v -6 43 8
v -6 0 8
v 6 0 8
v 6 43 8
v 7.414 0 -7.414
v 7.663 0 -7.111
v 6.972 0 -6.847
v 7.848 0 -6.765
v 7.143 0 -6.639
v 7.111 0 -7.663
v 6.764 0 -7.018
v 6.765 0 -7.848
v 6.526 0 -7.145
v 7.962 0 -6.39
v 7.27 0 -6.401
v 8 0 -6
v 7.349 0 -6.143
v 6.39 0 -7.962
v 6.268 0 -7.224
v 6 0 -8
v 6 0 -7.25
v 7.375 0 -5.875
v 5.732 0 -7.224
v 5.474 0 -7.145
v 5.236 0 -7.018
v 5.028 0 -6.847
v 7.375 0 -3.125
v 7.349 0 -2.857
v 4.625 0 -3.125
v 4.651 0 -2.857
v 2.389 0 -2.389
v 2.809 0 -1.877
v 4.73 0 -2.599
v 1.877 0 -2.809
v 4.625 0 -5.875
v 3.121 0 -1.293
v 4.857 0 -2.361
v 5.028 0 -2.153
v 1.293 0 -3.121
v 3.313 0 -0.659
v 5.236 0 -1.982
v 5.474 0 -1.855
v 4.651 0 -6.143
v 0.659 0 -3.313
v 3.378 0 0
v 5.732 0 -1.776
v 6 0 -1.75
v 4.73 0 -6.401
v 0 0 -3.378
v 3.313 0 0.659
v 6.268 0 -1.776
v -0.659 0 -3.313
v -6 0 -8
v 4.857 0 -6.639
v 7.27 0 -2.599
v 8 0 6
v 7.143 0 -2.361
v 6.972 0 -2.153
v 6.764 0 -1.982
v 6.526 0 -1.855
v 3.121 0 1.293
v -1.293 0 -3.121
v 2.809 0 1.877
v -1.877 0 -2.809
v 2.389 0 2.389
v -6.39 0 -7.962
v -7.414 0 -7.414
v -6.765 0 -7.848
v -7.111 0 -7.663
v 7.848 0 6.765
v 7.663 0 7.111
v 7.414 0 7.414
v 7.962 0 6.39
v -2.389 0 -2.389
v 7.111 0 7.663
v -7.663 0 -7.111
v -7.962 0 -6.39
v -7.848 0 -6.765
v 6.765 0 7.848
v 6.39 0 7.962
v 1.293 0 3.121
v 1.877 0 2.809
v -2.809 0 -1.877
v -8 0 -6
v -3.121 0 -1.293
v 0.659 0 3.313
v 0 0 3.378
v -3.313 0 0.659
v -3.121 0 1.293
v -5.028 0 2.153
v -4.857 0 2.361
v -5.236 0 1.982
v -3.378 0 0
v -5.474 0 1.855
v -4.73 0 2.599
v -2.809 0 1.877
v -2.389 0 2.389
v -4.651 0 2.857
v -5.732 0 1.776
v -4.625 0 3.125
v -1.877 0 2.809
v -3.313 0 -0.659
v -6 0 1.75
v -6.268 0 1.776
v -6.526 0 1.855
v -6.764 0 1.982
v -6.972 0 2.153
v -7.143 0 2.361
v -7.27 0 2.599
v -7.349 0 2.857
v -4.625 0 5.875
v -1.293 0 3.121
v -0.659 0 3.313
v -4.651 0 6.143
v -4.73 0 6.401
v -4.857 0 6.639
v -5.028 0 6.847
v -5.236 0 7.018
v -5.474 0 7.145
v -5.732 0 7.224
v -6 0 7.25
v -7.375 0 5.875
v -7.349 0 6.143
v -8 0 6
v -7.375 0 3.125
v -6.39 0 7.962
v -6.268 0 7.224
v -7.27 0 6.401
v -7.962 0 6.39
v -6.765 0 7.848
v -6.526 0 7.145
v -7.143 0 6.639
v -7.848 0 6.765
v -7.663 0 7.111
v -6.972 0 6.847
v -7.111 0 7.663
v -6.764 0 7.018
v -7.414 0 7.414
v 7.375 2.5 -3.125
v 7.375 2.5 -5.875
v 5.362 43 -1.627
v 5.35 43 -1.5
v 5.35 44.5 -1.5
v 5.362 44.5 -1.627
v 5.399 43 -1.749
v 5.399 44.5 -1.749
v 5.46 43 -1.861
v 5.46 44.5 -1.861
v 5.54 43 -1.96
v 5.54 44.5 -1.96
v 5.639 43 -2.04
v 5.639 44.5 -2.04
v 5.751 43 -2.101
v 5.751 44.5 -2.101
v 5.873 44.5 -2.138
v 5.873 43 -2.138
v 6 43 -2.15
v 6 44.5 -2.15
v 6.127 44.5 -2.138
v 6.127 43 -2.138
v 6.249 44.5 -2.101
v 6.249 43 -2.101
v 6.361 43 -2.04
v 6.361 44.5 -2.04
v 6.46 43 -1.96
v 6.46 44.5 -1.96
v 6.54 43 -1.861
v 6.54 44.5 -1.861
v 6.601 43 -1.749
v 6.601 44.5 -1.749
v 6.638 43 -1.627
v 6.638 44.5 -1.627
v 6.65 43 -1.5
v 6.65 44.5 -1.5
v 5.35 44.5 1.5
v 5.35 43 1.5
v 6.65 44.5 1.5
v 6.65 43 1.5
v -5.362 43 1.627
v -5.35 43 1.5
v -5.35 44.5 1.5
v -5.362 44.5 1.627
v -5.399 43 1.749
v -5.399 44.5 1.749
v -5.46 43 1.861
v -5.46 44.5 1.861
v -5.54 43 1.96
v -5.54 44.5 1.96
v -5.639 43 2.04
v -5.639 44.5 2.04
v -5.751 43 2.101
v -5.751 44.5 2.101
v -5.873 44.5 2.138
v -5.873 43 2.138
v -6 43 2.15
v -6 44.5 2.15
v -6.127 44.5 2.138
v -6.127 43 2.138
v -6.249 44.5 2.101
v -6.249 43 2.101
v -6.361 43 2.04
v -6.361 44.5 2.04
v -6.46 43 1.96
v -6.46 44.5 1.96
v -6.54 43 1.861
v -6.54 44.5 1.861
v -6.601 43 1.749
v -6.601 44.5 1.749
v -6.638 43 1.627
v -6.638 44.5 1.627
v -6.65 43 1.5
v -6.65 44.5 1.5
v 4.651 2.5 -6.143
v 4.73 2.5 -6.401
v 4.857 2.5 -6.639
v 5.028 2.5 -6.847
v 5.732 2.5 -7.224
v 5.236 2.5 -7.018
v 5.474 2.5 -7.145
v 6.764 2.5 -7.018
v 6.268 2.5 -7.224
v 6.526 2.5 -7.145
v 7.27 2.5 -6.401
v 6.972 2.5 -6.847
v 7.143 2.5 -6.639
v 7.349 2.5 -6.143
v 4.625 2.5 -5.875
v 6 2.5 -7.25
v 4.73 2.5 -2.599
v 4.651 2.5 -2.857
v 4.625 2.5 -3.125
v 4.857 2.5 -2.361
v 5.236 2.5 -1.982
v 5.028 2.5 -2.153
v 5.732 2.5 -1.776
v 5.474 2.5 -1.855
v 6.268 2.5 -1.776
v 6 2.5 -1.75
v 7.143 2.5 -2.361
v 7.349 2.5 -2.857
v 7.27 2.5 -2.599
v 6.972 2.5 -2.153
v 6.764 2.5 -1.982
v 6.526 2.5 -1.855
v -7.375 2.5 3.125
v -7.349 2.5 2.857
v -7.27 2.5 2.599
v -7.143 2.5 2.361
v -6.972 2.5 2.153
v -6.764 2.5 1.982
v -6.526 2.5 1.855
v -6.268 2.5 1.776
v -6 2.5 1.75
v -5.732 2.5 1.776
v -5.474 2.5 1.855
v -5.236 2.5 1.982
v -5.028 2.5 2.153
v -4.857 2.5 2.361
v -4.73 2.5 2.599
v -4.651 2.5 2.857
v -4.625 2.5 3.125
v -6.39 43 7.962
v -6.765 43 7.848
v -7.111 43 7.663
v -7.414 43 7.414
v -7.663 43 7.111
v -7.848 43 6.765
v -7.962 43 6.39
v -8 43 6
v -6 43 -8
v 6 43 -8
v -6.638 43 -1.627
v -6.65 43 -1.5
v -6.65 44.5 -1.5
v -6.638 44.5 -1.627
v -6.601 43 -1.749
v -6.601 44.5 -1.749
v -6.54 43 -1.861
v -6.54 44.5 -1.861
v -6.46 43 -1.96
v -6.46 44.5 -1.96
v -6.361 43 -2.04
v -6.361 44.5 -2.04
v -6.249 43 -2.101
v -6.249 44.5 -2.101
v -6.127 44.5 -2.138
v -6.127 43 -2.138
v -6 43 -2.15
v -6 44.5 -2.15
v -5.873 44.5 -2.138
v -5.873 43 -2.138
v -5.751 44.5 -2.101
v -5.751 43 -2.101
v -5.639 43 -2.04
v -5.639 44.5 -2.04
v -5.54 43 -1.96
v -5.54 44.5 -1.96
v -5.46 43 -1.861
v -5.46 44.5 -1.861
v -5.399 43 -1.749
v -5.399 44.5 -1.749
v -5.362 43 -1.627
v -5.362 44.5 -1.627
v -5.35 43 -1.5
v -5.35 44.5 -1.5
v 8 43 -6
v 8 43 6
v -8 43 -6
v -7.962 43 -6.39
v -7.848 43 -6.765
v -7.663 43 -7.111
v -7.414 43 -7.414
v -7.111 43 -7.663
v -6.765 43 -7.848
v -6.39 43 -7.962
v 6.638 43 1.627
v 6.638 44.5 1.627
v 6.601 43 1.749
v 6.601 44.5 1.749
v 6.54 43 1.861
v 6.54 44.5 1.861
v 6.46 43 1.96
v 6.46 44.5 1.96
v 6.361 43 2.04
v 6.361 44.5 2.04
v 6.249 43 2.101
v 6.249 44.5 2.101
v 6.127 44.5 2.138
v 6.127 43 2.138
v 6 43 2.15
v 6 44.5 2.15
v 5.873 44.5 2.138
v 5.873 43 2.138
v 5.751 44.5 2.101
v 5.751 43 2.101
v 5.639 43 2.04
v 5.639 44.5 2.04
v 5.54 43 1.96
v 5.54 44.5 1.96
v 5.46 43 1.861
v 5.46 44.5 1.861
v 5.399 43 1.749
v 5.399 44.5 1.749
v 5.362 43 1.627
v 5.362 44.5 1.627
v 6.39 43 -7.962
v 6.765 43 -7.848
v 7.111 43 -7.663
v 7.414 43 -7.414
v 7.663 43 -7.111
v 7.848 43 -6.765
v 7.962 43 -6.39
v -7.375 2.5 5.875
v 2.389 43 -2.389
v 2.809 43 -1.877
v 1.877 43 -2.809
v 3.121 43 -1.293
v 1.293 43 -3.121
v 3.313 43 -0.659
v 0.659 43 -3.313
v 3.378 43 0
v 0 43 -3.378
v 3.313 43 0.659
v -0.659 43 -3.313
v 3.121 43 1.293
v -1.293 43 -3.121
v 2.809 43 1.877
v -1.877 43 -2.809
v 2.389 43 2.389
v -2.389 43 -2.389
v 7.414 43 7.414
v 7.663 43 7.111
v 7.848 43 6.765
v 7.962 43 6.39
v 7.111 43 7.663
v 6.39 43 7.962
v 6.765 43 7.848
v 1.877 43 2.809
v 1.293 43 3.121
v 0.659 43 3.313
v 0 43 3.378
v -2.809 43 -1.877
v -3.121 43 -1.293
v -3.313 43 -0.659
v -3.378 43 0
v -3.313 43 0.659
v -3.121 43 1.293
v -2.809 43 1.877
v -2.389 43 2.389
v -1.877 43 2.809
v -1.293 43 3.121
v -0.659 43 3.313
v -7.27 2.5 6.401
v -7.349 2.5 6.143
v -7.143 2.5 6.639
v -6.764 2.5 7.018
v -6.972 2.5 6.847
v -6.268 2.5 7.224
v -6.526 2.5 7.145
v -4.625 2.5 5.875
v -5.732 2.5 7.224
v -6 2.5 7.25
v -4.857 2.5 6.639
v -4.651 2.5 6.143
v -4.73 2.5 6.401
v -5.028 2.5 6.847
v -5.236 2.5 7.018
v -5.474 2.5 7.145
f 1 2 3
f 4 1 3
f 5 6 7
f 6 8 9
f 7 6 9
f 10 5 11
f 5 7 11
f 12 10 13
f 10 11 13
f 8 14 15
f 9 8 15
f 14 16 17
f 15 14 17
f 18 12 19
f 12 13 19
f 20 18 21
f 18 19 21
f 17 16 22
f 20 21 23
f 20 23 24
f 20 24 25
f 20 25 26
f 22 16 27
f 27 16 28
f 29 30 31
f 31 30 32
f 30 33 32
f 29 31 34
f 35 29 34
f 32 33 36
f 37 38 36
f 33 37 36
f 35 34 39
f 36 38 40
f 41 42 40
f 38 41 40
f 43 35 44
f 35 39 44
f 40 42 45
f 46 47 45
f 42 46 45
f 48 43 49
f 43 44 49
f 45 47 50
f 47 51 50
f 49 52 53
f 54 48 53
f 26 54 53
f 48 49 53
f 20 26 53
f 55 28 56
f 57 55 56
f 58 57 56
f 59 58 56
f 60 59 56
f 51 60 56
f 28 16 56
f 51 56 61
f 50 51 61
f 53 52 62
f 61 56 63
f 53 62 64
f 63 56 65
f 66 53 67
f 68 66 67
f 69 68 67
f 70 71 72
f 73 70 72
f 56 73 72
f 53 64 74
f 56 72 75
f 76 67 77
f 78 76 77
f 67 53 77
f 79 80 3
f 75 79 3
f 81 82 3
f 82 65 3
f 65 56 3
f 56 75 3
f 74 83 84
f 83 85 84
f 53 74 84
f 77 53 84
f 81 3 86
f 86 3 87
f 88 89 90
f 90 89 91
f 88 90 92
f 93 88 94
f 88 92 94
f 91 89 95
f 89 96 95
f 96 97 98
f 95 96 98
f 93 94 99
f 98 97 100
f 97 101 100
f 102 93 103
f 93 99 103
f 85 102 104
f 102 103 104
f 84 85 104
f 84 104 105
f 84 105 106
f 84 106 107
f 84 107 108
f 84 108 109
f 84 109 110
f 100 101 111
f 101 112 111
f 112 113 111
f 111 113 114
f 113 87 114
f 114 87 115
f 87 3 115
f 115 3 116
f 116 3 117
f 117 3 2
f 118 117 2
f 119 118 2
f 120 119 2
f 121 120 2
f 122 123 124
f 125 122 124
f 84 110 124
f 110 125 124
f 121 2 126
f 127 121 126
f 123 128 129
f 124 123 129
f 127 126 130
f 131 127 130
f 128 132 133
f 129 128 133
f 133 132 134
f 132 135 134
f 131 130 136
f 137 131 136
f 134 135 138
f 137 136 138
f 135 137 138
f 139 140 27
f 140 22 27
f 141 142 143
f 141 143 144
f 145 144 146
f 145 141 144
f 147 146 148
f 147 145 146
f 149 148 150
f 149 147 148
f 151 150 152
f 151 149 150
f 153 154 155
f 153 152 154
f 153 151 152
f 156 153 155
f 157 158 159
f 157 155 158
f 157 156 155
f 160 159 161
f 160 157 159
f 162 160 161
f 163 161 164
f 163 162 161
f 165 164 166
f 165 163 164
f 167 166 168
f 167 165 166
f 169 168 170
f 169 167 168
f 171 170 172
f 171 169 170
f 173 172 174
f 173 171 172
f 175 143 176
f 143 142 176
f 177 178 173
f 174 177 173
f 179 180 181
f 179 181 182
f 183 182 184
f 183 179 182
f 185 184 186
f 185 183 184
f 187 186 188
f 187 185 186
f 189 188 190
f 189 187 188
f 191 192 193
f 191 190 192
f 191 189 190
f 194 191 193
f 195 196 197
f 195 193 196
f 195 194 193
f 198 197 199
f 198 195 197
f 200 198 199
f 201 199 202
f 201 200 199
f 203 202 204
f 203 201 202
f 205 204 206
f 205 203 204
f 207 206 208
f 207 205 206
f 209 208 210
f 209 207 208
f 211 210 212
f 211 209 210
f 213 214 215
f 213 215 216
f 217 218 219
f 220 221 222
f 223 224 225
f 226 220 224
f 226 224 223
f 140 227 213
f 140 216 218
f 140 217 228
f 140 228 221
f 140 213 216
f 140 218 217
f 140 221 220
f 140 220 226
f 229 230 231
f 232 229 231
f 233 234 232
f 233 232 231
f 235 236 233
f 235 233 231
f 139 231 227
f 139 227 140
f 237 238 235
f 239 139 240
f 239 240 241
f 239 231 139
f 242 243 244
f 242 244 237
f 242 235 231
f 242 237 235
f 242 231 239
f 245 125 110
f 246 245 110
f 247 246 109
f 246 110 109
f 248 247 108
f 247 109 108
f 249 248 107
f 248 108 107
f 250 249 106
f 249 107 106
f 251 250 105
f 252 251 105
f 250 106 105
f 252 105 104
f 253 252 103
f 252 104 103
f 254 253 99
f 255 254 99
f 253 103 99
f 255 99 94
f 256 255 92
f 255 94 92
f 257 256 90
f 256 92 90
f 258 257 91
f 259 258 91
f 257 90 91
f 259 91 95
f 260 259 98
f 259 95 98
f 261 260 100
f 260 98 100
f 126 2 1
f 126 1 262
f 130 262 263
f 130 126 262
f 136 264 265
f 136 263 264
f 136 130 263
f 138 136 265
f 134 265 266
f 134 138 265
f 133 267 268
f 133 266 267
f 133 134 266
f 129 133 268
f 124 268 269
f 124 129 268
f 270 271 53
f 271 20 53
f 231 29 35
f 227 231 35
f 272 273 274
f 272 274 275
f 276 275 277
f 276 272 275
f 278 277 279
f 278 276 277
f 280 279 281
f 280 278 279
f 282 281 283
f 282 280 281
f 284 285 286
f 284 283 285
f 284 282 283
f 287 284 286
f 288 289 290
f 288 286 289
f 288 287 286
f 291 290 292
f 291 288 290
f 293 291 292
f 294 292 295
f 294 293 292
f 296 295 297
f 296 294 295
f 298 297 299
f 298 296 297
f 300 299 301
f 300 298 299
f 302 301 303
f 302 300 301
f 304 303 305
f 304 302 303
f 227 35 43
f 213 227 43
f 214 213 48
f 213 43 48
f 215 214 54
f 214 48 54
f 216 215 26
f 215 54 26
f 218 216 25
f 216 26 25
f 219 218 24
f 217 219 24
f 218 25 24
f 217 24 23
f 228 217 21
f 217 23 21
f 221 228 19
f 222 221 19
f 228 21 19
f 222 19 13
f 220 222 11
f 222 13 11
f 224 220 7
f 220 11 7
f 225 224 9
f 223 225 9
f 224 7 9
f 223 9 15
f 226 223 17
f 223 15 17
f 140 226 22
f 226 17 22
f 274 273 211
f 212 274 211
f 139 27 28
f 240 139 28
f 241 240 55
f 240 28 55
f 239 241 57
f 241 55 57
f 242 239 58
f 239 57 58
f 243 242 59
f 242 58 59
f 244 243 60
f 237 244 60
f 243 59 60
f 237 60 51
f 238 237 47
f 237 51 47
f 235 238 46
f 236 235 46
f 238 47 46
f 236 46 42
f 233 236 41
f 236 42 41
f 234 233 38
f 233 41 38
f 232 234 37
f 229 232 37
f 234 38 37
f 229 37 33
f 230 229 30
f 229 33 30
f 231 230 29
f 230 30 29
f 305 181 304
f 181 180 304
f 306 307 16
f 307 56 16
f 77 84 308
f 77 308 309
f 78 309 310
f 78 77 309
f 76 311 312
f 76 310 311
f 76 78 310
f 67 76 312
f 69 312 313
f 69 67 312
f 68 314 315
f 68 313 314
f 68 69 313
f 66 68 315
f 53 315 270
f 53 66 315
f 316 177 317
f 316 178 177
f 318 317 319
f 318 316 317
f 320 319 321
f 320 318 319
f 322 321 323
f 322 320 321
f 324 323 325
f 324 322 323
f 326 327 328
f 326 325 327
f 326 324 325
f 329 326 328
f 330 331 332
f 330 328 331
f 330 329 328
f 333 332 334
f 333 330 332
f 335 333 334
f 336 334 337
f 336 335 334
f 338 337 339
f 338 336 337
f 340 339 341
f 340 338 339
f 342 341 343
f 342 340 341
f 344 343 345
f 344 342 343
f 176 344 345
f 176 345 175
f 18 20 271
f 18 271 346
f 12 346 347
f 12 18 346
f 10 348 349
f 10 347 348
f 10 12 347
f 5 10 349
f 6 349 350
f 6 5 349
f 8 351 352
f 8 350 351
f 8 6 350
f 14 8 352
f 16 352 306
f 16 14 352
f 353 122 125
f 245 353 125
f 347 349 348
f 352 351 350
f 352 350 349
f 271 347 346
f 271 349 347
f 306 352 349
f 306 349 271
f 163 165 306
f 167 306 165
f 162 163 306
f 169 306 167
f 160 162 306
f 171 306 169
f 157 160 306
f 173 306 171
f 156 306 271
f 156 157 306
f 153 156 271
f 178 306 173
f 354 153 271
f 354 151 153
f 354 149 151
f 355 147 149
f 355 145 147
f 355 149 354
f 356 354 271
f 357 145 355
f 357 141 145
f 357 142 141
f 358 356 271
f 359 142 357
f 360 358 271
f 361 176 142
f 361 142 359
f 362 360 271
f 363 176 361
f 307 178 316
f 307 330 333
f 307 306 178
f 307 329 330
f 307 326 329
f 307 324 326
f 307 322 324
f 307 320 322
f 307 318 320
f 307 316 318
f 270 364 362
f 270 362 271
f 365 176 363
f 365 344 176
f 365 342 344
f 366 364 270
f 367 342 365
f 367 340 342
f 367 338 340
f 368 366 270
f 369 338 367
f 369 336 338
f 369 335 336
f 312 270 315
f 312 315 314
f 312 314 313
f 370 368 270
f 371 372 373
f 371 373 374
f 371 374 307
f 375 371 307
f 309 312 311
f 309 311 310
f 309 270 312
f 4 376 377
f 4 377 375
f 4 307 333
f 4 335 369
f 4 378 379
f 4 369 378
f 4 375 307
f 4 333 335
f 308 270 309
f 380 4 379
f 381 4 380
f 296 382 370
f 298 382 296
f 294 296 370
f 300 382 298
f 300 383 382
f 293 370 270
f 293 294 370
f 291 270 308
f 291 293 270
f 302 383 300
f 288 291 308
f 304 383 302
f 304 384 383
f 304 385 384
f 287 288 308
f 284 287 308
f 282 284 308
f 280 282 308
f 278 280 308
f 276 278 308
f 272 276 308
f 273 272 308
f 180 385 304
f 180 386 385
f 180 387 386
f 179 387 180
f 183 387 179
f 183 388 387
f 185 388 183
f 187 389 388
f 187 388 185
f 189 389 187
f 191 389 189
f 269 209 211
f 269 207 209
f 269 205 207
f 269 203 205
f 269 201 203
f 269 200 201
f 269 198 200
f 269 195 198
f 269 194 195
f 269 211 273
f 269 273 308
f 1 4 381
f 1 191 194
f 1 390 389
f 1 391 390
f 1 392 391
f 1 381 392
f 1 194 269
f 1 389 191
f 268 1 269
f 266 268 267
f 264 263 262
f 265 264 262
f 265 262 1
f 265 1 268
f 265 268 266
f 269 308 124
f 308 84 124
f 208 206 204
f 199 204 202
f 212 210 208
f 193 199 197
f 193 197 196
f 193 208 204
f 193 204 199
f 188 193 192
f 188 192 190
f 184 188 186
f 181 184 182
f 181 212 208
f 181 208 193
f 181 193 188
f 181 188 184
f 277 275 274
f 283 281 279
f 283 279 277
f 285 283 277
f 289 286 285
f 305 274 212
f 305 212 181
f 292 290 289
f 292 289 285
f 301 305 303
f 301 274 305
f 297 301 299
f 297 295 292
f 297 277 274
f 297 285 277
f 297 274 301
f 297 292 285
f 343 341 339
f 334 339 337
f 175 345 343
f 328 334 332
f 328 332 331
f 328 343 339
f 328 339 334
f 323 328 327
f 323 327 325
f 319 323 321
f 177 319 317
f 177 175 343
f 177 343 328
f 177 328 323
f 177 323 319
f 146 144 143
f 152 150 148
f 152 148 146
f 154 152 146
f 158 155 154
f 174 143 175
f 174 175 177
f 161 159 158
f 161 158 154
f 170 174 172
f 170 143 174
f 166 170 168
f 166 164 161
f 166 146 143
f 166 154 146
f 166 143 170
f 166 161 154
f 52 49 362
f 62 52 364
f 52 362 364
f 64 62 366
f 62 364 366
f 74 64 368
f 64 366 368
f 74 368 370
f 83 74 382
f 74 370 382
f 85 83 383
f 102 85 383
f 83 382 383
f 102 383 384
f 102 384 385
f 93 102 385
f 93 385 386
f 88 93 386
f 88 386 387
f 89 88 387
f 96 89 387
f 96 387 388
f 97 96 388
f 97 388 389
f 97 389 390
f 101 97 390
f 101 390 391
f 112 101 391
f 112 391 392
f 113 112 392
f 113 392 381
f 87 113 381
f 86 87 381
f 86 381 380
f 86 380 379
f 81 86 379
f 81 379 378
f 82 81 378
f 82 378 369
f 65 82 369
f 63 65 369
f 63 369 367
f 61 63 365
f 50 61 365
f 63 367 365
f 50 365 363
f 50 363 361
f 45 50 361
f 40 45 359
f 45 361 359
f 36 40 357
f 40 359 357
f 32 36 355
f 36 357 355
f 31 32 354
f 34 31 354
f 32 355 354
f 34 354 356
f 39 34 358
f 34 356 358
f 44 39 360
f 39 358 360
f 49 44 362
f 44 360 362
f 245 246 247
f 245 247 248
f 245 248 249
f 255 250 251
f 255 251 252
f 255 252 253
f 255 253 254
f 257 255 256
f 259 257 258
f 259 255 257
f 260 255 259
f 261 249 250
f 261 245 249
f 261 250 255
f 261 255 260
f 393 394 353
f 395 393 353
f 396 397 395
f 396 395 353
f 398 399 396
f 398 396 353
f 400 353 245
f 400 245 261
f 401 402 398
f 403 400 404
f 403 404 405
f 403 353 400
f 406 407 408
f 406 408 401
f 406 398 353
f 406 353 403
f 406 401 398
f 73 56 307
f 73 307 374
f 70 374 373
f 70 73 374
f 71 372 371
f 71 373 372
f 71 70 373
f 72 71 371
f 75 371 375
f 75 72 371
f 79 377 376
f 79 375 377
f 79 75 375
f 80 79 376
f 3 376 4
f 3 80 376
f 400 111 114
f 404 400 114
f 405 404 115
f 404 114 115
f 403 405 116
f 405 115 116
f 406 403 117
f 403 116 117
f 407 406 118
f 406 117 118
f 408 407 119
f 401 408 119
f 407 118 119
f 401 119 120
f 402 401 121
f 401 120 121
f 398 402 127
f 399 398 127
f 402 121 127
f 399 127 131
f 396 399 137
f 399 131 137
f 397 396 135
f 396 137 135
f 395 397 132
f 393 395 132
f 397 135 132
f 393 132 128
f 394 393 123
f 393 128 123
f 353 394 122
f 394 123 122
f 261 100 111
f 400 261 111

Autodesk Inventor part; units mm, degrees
ref_plane "YZ Plane" through (0, 0, 0) normal (1, 0, 0) x (0, 1, 0)
ref_plane "XZ Plane" through (0, 0, 0) normal (0, 1, 0) x (-1, 0, 0)
ref_plane "XY Plane" through (0, 0, 0) normal (0, 0, 1) x (1, 0, 0)
sketch "Sketch1" plane through (0, 0, 0) normal (0, 1, 0) x (-1, 0, 0)
  line L0 (6, 8) -> (-6, 8)
  line L1 (-8, 6) -> (-8, -6)
  line L2 (-6, -8) -> (6, -8)
  line L3 (8, -6) -> (8, 6)
  arc A0 (8, 6) -> (6, 8) centre (6, 6) ccw
  arc A1 (-6, 8) -> (-8, 6) centre (-6, 6) ccw
  arc A2 (-8, -6) -> (-6, -8) centre (-6, -6) ccw
  arc A3 (6, -8) -> (8, -6) centre (6, -6) ccw
  point P0 (0, 0)
  point P1 (8, 8)
  point P2 (-8, 8)
  point P3 (8, -8)
  dimension "d0" = 16
  dimension "d1" = 16
  dimension "d2" = 8
  dimension "d3" = 8
  dimension "d4" = 2
extrude "Extrusion1" add sketch "Sketch1" along normal blind 43
sketch "Sketch2" plane through (0, 0, 0) normal (0, -1, 0) x (1, 0, 0)
  line L0 (-6, 5.875) -> (-6, 3.125) construction
  line L1 (-7.375, 5.875) -> (-7.375, 3.125)
  line L2 (-4.625, 3.125) -> (-4.625, 5.875)
  arc A0 (-4.625, 5.875) -> (-7.375, 5.875) centre (-6, 5.875) ccw
  arc A1 (-7.375, 3.125) -> (-4.625, 3.125) centre (-6, 3.125) ccw
  line L3 (6, -3.125) -> (6, -5.875) construction
  line L4 (4.625, -3.125) -> (4.625, -5.875)
  line L5 (7.375, -5.875) -> (7.375, -3.125)
  arc A2 (7.375, -3.125) -> (4.625, -3.125) centre (6, -3.125) ccw
  arc A3 (4.625, -5.875) -> (7.375, -5.875) centre (6, -5.875) ccw
  point P0 (0, 0)
  point P1 (0, 0)
  point P2 (-6, 4.5)
  point P3 (6, -4.5)
  dimension "d7" = 2.75
  dimension "d8" = 12
  dimension "d9" = 6
  dimension "d10" = 9
  dimension "d11" = 4.5
  dimension "d12" = 2.75
  dimension "d13" = 2.75
  dimension "d14" = 2.75
extrude "Extrusion2" cut sketch "Sketch2" against normal blind 2.5
hole "Hole1" at (0, 0, 0) direction (0, 1, 0) diameter 6.756 end through all clearance for "Flat Head Machine Screw (82)" size "1/4" standard "Ansi Unified Screw Threads"
sketch "Sketch3" plane through (0, 43, 0) normal (0, 1, 0) x (1, 0, 0)
  line L0 (-6, 1.5) -> (-6, -1.5) construction
  line L1 (-6.65, 1.5) -> (-6.65, -1.5)
  line L2 (-5.35, -1.5) -> (-5.35, 1.5)
  arc A0 (-5.35, 1.5) -> (-6.65, 1.5) centre (-6, 1.5) ccw
  arc A1 (-6.65, -1.5) -> (-5.35, -1.5) centre (-6, -1.5) ccw
  line L3 (6, 1.5) -> (6, -1.5) construction
  line L4 (5.35, 1.5) -> (5.35, -1.5)
  line L5 (6.65, -1.5) -> (6.65, 1.5)
  arc A2 (6.65, 1.5) -> (5.35, 1.5) centre (6, 1.5) ccw
  arc A3 (5.35, -1.5) -> (6.65, -1.5) centre (6, -1.5) ccw
  line L6 (-6, 0) -> (6, 0) construction
  line L7 (6, 8) -> (-6, 8) projected
  point P0 (0, 0)
  dimension "d25" = 0.65
  dimension "d26" = 0.65
  dimension "d27" = 3
  dimension "d29" = 0
  dimension "d30" = 12
  dimension "d31" = 6
  dimension "d32" = 3
extrude "Extrusion3" add sketch "Sketch3" along normal blind 1.5
equation "\"d1\" = d0"
equation "\"d2\" = 0.5 * d0"
equation "\"d3\" = d2"
equation "\"d9\" = 0.5 * d8"
equation "\"d11\" = 0.5 * d10"
equation "\"d12\" = d7"
equation "\"d13\" = d7"
equation "\"d14\" = d7"
equation "\"d26\" = d25"
equation "\"d27\" = d32"
equation "\"d31\" = 0.5 * d30"
properties part number "Camera Mount 30mm"
